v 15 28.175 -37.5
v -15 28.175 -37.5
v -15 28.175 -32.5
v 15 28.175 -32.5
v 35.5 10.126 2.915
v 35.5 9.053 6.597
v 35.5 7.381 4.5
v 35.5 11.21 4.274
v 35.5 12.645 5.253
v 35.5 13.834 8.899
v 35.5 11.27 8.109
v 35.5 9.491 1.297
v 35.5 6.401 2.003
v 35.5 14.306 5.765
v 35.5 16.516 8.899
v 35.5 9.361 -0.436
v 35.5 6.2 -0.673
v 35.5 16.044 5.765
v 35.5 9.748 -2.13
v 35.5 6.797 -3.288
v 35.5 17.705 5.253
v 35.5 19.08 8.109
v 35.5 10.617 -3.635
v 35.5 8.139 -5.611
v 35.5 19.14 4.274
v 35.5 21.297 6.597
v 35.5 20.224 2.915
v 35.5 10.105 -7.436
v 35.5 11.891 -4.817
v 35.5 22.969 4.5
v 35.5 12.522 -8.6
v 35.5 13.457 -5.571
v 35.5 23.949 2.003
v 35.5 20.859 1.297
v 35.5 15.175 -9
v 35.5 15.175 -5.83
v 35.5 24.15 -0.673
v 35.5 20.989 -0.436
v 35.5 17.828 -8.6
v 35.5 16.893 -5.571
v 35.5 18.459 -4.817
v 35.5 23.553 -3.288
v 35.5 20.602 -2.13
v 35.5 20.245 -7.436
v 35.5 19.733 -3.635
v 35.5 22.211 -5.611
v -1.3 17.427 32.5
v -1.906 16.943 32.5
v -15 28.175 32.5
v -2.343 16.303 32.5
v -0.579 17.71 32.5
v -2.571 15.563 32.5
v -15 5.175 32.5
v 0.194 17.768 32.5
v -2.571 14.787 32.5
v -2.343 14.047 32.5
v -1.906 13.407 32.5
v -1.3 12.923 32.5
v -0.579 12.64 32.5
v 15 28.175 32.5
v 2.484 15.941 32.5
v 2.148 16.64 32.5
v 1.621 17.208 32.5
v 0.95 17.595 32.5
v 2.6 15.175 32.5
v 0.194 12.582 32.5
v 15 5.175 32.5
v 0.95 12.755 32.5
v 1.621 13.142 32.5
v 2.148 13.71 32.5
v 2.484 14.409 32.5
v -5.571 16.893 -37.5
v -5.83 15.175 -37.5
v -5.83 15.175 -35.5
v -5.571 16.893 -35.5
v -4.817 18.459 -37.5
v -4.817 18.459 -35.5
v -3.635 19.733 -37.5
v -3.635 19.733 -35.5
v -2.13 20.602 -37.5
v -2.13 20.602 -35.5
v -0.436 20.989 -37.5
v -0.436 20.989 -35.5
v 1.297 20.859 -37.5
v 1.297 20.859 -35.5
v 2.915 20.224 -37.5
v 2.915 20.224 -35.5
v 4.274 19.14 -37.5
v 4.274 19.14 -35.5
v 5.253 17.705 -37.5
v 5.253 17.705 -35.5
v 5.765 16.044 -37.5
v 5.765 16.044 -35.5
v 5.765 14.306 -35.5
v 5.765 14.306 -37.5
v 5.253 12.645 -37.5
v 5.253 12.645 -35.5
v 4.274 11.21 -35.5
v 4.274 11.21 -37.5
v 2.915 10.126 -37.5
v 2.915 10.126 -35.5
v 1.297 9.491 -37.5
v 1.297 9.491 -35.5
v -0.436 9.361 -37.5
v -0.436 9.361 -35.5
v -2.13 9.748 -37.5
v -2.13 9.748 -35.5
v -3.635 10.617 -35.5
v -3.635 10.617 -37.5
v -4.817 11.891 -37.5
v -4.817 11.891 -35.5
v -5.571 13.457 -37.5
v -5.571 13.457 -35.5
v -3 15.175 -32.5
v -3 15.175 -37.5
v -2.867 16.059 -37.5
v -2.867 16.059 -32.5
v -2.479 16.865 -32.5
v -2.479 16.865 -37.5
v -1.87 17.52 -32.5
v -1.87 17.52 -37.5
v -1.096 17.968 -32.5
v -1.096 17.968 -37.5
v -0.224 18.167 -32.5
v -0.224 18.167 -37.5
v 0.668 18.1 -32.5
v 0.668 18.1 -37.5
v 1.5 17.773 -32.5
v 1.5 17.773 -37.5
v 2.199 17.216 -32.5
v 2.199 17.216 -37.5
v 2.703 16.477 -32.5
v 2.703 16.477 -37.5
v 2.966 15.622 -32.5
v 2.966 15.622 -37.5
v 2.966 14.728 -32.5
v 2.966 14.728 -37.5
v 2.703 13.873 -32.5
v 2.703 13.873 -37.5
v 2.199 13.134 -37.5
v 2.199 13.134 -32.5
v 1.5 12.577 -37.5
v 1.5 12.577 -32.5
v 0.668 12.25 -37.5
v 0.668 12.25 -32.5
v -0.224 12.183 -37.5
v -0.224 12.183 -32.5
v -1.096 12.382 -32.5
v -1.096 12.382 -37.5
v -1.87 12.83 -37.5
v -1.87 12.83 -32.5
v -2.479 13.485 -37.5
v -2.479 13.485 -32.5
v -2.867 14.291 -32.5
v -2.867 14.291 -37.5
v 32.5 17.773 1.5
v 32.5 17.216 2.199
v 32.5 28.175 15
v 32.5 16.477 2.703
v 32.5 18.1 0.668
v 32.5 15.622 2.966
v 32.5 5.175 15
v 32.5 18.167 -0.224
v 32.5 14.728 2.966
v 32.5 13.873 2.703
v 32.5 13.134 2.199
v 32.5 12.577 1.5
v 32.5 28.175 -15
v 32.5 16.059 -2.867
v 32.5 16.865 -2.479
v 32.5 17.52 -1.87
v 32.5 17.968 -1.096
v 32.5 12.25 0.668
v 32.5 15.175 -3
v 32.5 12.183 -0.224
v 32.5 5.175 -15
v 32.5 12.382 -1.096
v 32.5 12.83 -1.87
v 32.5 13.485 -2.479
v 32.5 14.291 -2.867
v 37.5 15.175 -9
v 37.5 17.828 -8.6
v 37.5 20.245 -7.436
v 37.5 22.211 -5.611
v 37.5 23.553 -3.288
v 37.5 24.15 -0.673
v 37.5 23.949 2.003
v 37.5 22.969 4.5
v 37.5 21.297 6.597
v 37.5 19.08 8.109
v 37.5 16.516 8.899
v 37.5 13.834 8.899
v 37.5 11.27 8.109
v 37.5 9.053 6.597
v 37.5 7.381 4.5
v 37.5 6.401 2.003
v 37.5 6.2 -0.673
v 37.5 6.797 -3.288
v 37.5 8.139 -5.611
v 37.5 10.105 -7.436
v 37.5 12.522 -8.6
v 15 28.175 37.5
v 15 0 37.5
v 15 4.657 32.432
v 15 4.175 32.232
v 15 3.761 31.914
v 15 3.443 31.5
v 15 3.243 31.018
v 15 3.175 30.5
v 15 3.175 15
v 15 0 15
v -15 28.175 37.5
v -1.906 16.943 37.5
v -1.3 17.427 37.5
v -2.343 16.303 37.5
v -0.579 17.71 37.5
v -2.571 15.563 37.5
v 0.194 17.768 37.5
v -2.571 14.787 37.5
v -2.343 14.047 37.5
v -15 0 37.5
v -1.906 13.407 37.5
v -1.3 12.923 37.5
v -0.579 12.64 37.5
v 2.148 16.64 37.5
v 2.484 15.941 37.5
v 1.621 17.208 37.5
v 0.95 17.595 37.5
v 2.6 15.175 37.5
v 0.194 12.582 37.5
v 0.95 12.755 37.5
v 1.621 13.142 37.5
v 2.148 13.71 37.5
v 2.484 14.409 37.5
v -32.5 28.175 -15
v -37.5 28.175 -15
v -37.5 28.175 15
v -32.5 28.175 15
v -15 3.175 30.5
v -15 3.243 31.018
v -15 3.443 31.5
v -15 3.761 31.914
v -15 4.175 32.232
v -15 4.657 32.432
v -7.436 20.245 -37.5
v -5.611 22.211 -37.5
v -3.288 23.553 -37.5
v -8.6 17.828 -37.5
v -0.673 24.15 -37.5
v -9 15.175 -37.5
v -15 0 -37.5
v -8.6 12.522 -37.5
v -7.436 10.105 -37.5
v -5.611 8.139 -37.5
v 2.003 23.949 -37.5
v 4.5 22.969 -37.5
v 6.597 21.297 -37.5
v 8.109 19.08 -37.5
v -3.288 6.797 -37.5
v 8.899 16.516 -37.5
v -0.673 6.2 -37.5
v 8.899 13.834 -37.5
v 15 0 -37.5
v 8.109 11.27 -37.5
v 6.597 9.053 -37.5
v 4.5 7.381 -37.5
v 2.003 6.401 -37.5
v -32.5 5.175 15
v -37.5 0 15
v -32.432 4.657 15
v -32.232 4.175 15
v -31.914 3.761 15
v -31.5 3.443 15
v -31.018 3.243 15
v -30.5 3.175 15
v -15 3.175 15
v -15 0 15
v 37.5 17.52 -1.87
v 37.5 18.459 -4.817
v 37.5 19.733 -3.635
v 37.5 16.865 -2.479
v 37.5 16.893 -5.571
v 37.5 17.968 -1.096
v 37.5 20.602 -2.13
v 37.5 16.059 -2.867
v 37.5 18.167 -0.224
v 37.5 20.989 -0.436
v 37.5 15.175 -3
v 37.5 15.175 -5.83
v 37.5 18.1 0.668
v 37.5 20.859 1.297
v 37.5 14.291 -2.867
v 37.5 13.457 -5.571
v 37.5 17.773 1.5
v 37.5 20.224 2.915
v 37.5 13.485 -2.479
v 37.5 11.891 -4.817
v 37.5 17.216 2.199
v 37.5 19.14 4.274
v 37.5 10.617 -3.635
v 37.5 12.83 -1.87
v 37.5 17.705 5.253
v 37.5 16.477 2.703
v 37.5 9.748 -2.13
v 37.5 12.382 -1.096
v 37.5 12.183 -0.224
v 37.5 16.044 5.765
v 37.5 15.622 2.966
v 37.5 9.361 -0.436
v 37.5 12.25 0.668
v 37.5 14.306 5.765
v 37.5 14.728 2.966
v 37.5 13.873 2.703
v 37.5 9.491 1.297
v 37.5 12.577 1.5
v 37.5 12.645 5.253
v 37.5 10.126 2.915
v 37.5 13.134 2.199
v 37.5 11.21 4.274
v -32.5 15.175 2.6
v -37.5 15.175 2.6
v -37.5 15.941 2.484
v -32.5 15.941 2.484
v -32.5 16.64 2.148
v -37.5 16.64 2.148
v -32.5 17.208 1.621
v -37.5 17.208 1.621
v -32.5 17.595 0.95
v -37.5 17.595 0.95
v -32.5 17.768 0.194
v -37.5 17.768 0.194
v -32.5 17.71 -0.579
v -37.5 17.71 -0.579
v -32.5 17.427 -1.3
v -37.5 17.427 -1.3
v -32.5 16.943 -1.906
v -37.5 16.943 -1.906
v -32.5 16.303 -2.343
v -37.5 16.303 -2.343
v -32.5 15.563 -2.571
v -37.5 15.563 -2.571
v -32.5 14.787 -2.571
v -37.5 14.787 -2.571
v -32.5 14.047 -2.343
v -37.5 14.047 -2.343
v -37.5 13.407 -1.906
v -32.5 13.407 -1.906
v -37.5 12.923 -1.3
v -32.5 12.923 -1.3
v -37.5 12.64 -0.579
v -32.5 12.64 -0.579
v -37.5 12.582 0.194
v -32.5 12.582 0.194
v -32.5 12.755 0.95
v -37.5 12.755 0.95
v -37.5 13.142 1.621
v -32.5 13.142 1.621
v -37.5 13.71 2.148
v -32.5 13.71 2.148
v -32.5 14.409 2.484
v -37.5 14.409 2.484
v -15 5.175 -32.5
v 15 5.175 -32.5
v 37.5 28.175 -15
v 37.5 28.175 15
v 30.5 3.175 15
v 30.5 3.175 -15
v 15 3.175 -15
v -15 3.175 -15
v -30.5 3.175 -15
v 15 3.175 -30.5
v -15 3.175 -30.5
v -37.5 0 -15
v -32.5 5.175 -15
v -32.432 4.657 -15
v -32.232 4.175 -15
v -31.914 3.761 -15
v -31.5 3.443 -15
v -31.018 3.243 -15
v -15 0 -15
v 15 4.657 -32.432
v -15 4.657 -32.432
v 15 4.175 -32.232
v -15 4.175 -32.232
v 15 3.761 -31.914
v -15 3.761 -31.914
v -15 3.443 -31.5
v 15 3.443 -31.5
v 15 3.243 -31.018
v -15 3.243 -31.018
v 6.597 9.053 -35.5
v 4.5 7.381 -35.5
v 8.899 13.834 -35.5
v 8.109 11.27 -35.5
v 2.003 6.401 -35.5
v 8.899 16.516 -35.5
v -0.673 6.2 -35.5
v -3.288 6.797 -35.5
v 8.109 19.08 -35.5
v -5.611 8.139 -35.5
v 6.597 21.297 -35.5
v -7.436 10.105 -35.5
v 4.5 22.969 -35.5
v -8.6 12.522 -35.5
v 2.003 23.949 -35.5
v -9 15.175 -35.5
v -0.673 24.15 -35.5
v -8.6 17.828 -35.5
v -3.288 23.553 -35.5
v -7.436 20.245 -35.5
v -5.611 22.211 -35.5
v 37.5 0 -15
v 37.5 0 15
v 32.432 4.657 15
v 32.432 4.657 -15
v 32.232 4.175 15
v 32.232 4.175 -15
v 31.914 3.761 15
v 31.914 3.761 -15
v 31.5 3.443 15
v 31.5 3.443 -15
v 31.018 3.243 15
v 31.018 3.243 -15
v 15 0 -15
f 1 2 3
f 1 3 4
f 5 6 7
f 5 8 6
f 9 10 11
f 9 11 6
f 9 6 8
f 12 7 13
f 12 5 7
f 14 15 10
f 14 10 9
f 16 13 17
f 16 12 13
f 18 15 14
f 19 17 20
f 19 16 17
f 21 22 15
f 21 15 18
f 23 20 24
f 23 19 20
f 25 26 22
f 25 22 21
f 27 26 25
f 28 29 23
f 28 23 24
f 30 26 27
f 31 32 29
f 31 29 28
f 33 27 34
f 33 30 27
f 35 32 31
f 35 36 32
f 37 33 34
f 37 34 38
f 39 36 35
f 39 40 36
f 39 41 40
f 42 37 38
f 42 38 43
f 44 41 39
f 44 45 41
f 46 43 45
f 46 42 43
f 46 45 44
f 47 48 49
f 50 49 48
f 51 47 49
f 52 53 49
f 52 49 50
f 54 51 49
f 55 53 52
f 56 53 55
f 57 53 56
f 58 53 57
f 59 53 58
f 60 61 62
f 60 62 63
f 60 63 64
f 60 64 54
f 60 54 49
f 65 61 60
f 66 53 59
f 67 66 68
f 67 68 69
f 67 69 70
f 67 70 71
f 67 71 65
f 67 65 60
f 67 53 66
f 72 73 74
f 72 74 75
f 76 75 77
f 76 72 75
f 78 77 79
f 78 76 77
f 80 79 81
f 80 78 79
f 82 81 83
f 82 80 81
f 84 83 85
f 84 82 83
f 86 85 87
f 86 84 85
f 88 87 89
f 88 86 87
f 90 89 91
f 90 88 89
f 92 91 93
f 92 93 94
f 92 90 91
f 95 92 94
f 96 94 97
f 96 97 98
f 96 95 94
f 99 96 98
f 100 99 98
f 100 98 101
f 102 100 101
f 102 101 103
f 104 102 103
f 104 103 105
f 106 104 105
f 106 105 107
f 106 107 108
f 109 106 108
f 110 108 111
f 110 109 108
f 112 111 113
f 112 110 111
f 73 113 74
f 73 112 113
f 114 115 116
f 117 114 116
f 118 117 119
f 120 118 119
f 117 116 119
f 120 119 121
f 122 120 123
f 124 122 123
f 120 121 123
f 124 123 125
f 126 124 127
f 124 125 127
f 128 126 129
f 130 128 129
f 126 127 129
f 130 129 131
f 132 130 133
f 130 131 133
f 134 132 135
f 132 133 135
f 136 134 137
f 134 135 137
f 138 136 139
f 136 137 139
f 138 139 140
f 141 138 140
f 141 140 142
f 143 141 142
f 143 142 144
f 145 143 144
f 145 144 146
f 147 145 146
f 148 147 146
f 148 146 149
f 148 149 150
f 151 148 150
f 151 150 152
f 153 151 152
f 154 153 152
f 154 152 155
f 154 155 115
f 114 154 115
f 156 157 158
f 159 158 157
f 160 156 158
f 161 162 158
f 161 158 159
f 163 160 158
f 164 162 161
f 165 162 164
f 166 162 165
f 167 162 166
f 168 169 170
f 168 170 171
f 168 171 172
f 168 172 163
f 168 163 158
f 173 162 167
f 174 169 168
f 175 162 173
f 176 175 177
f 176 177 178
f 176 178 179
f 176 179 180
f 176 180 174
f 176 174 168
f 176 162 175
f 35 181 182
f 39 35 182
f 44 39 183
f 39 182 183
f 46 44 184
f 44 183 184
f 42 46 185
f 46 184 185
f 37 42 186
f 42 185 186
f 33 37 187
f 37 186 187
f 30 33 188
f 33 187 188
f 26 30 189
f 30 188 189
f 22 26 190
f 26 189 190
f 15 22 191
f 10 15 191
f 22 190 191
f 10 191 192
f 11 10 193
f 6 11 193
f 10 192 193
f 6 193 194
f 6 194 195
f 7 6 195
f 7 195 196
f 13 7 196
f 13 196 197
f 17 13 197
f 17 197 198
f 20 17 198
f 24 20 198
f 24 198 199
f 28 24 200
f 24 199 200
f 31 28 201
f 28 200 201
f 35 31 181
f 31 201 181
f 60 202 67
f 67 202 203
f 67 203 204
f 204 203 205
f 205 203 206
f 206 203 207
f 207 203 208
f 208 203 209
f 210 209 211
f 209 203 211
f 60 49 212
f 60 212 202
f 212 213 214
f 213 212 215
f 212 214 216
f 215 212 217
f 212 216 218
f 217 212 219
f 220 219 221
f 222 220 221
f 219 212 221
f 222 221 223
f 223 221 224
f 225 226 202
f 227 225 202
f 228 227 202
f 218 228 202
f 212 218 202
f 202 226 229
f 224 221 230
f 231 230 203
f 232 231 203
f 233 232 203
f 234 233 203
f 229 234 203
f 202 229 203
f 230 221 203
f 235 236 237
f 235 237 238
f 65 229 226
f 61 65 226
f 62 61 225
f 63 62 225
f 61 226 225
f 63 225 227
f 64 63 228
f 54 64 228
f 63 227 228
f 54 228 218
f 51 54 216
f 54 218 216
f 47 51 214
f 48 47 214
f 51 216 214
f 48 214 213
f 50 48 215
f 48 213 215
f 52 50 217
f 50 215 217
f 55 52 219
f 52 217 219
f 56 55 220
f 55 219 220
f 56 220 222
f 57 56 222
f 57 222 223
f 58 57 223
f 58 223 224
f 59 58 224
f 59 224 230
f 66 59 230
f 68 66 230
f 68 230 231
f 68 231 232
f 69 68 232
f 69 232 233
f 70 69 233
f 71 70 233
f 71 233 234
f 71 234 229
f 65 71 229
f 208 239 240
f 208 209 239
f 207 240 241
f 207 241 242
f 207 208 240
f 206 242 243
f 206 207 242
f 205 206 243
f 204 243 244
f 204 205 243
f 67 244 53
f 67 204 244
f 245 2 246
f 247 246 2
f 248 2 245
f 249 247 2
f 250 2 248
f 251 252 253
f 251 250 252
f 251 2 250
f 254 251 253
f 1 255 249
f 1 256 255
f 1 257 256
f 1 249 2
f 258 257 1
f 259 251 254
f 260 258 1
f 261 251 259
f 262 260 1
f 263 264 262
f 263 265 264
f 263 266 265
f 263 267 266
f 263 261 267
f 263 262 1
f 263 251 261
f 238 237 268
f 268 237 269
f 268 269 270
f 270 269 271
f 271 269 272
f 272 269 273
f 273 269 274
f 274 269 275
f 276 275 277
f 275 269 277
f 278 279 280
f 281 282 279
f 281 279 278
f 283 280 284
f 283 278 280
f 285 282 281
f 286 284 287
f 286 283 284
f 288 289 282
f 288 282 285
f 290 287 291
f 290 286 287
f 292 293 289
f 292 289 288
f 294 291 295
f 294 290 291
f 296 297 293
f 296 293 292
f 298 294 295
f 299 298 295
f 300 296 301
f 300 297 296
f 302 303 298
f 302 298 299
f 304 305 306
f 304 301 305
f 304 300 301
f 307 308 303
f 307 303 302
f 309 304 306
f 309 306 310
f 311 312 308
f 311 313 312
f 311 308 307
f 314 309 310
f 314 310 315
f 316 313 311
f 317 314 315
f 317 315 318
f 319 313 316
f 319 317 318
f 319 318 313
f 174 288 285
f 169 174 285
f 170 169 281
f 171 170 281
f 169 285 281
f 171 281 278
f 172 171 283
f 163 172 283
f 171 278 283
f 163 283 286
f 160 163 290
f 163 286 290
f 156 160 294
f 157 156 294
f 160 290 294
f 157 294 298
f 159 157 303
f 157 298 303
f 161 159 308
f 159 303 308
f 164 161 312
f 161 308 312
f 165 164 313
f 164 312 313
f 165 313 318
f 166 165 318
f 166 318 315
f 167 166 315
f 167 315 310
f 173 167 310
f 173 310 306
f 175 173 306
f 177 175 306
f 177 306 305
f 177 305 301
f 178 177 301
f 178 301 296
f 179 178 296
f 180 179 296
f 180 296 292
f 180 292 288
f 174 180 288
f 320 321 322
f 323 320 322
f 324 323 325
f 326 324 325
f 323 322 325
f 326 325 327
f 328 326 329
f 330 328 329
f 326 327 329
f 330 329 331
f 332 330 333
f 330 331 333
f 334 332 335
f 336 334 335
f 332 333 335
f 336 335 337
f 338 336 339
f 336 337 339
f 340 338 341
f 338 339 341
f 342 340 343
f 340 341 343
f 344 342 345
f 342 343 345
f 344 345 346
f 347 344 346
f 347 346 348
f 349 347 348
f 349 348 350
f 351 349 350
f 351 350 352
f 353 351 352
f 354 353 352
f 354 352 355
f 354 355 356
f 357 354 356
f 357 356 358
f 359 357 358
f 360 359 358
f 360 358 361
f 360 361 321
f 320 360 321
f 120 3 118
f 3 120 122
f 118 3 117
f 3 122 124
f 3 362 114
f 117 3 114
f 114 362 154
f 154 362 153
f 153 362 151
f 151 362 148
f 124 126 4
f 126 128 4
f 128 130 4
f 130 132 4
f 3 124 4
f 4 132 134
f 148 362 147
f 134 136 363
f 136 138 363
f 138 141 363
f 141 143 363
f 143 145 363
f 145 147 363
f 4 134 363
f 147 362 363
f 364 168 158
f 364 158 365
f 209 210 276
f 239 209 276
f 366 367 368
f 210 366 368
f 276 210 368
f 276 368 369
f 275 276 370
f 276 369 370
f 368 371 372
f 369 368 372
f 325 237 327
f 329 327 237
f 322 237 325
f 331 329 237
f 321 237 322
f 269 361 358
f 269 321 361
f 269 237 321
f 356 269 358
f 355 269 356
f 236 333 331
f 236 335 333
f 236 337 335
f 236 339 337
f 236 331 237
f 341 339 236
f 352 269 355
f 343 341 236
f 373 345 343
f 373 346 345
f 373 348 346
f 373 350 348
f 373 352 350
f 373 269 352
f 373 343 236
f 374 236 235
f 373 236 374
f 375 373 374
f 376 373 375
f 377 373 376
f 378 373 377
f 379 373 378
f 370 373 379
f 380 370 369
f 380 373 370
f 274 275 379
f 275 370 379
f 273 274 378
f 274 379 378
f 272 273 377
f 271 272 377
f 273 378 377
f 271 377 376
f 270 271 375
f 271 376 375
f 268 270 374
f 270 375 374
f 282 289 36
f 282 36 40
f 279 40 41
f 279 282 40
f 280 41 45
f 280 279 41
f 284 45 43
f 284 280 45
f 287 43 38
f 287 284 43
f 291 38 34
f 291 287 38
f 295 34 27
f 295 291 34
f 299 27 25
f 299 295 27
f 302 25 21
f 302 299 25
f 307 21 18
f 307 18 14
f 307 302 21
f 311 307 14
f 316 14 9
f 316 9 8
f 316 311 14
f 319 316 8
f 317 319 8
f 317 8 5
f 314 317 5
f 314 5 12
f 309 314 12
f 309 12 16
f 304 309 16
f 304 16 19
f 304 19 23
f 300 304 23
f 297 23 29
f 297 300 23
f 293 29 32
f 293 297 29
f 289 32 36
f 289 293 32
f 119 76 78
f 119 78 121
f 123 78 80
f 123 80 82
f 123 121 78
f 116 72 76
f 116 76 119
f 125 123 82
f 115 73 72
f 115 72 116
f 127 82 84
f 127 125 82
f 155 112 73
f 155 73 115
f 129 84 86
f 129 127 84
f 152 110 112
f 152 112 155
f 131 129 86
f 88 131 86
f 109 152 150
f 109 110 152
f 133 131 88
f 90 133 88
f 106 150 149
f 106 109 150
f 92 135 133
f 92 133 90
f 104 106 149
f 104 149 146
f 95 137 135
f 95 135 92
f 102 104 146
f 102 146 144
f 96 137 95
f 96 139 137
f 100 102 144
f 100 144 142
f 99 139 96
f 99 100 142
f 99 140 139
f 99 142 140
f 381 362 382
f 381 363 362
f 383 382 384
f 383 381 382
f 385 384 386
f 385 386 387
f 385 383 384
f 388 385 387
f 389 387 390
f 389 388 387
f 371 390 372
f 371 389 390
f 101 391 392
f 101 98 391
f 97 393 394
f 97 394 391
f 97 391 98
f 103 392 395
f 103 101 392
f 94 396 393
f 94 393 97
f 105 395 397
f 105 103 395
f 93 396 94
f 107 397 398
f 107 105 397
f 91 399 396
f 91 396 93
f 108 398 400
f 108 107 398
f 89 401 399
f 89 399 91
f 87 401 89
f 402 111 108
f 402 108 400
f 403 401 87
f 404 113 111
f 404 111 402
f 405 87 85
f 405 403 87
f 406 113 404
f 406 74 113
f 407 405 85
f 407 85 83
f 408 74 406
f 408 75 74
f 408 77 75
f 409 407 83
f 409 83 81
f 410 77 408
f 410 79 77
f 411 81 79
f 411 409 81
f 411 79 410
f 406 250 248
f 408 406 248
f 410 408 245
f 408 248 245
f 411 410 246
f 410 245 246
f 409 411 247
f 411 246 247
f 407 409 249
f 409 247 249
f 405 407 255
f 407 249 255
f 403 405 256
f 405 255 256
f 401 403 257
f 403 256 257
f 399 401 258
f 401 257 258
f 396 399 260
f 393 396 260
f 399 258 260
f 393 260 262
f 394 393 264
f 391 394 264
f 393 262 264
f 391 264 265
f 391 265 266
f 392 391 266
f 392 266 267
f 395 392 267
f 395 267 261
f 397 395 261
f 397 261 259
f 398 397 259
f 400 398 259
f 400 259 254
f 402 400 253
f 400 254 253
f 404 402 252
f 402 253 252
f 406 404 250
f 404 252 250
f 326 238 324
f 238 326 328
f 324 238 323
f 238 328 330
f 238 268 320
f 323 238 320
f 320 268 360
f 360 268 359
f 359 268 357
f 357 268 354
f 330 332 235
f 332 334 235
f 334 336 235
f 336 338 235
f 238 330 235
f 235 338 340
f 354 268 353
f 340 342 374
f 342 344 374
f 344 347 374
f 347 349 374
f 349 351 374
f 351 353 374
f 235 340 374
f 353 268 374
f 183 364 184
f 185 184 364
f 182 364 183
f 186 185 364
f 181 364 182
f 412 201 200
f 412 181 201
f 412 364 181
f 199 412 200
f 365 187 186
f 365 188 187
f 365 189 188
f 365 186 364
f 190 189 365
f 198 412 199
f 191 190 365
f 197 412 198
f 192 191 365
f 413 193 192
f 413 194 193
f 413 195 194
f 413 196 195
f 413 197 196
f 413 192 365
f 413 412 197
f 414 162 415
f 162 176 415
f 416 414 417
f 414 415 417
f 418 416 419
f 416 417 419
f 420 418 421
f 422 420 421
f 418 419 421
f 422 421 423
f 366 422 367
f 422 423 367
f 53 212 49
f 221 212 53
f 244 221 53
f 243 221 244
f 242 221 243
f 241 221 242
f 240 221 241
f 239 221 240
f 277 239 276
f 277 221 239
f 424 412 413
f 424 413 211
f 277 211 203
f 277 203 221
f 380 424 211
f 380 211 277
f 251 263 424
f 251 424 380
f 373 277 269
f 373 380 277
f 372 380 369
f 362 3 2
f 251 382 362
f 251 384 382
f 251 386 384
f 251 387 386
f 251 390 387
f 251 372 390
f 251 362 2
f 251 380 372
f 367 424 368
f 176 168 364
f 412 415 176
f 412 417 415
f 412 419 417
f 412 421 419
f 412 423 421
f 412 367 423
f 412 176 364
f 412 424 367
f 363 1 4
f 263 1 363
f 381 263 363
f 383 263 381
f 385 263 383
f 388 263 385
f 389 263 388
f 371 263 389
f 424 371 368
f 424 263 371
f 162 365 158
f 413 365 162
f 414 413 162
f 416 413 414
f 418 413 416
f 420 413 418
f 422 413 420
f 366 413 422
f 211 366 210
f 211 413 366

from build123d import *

# Parameters (mm, degrees)
BOSS_EXTRUDE1_DEPTH = 3.175
SKETCH4_W           = 5
SKETCH4_H           = 30
BOSS_EXTRUDE3_DEPTH = 25
FILLET1_R           = 2
SKETCH5_W           = 30
SKETCH5_H           = 5
BOSS_EXTRUDE4_DEPTH = 25
FILLET2_R           = 2
SKETCH6_R           = 2.6
CUT_EXTRUDE1_DEPTH  = 10
CIRPATTERN1_COUNT   = 2
CIRPATTERN1_ANGLE   = 90
SKETCH7_R           = 3
CUT_EXTRUDE2_DEPTH  = 10
CIRPATTERN2_COUNT   = 2
CIRPATTERN2_ANGLE   = 90
SKETCH10_R          = 9
SKETCH10_R_2        = 5.83
CUT_EXTRUDE9_DEPTH  = 2
CIRPATTERN4_COUNT   = 2
CIRPATTERN4_ANGLE   = 270


with BuildPart() as part:
    # Sketch1 → Boss-Extrude1 (new body)
    with BuildSketch(Plane(origin=(0, 0, 0), x_dir=(1, 0, 0), z_dir=(0, 1, 0))):
        Polygon((-15, 15), (-15, 37.5), (15, 37.5), (15, 15), (37.5, 15), (37.5, -15), (15, -15), (15, -37.5), (-15, -37.5), (-15, -15), (-37.5, -15), (-37.5, 15), align=None)
    extrude(amount=BOSS_EXTRUDE1_DEPTH)

    # Sketch4 → Boss-Extrude3 (add)
    with BuildSketch(Plane(origin=(0, 3.175, 0), x_dir=(1, 0, 0), z_dir=(0, 1, 0))):
        with Locations((-35, 0)):
            Rectangle(SKETCH4_W, SKETCH4_H)
        with Locations((35, 0)):
            Rectangle(SKETCH4_W, SKETCH4_H)
    extrude(amount=BOSS_EXTRUDE3_DEPTH)

    # Fillet1
    fillet1_edges = [part.edges().sort_by_distance(p)[0] for p in [
        (-32.5, 3.175, 0),
        (32.5, 3.175, 0),
    ]]
    fillet(fillet1_edges, radius=FILLET1_R)

    # Sketch5 → Boss-Extrude4 (add)
    with BuildSketch(Plane(origin=(0, 3.175, 0), x_dir=(1, 0, 0), z_dir=(0, 1, 0))):
        with Locations((0, -35)):
            Rectangle(SKETCH5_W, SKETCH5_H)
        with Locations((0, 35)):
            Rectangle(SKETCH5_W, SKETCH5_H)
    extrude(amount=BOSS_EXTRUDE4_DEPTH)

    # Fillet2
    fillet2_edges = [part.edges().sort_by_distance(p)[0] for p in [
        (0, 3.175, 32.5),
        (0, 3.175, -32.5),
    ]]
    fillet(fillet2_edges, radius=FILLET2_R)

    # Sketch6 → Cut-Extrude1 (cut)
    with BuildSketch(Plane.ZY.offset(37.5)):
        with Locations((0, 15.175)):
            Circle(SKETCH6_R)
    cut_extrude1 = extrude(amount=-CUT_EXTRUDE1_DEPTH, mode=Mode.SUBTRACT)

    # CirPattern1: Cut-Extrude1 ×2 about axis
    cirpattern1_axis = Axis((0, 3.175, 0), (0, 1, 0))
    for i in range(1, CIRPATTERN1_COUNT):
        add(cut_extrude1.rotate(cirpattern1_axis, i * CIRPATTERN1_ANGLE / (CIRPATTERN1_COUNT - 1)), mode=Mode.SUBTRACT)

    # Sketch7 → Cut-Extrude2 (cut)
    with BuildSketch(Plane(origin=(37.5, 0, 0), x_dir=(0, 0, -1), z_dir=(1, 0, 0))):
        with Locations((0, 15.175)):
            Circle(SKETCH7_R)
    cut_extrude2 = extrude(amount=-CUT_EXTRUDE2_DEPTH, mode=Mode.SUBTRACT)

    # CirPattern2: Cut-Extrude2 ×2 about axis
    cirpattern2_axis = Axis((0, 3.175, 0), (0, 1, 0))
    for i in range(1, CIRPATTERN2_COUNT):
        add(cut_extrude2.rotate(cirpattern2_axis, i * CIRPATTERN2_ANGLE / (CIRPATTERN2_COUNT - 1)), mode=Mode.SUBTRACT)

    # Sketch10 → Cut-Extrude9 (cut)
    with BuildSketch(Plane(origin=(0, 0, -37.5), x_dir=(-1, 0, 0), z_dir=(0, 0, -1))):
        with Locations((0, 15.175)):
            Circle(SKETCH10_R)
        with Locations((0, 15.175)):
            Circle(SKETCH10_R_2, mode=Mode.SUBTRACT)
    cut_extrude9 = extrude(amount=-CUT_EXTRUDE9_DEPTH, mode=Mode.SUBTRACT)

    # CirPattern4: Cut-Extrude9 ×2 about axis
    cirpattern4_axis = Axis((0, 3.175, 0), (0, 1, 0))
    for i in range(1, CIRPATTERN4_COUNT):
        add(cut_extrude9.rotate(cirpattern4_axis, i * CIRPATTERN4_ANGLE / (CIRPATTERN4_COUNT - 1)), mode=Mode.SUBTRACT)


solid = part.part
